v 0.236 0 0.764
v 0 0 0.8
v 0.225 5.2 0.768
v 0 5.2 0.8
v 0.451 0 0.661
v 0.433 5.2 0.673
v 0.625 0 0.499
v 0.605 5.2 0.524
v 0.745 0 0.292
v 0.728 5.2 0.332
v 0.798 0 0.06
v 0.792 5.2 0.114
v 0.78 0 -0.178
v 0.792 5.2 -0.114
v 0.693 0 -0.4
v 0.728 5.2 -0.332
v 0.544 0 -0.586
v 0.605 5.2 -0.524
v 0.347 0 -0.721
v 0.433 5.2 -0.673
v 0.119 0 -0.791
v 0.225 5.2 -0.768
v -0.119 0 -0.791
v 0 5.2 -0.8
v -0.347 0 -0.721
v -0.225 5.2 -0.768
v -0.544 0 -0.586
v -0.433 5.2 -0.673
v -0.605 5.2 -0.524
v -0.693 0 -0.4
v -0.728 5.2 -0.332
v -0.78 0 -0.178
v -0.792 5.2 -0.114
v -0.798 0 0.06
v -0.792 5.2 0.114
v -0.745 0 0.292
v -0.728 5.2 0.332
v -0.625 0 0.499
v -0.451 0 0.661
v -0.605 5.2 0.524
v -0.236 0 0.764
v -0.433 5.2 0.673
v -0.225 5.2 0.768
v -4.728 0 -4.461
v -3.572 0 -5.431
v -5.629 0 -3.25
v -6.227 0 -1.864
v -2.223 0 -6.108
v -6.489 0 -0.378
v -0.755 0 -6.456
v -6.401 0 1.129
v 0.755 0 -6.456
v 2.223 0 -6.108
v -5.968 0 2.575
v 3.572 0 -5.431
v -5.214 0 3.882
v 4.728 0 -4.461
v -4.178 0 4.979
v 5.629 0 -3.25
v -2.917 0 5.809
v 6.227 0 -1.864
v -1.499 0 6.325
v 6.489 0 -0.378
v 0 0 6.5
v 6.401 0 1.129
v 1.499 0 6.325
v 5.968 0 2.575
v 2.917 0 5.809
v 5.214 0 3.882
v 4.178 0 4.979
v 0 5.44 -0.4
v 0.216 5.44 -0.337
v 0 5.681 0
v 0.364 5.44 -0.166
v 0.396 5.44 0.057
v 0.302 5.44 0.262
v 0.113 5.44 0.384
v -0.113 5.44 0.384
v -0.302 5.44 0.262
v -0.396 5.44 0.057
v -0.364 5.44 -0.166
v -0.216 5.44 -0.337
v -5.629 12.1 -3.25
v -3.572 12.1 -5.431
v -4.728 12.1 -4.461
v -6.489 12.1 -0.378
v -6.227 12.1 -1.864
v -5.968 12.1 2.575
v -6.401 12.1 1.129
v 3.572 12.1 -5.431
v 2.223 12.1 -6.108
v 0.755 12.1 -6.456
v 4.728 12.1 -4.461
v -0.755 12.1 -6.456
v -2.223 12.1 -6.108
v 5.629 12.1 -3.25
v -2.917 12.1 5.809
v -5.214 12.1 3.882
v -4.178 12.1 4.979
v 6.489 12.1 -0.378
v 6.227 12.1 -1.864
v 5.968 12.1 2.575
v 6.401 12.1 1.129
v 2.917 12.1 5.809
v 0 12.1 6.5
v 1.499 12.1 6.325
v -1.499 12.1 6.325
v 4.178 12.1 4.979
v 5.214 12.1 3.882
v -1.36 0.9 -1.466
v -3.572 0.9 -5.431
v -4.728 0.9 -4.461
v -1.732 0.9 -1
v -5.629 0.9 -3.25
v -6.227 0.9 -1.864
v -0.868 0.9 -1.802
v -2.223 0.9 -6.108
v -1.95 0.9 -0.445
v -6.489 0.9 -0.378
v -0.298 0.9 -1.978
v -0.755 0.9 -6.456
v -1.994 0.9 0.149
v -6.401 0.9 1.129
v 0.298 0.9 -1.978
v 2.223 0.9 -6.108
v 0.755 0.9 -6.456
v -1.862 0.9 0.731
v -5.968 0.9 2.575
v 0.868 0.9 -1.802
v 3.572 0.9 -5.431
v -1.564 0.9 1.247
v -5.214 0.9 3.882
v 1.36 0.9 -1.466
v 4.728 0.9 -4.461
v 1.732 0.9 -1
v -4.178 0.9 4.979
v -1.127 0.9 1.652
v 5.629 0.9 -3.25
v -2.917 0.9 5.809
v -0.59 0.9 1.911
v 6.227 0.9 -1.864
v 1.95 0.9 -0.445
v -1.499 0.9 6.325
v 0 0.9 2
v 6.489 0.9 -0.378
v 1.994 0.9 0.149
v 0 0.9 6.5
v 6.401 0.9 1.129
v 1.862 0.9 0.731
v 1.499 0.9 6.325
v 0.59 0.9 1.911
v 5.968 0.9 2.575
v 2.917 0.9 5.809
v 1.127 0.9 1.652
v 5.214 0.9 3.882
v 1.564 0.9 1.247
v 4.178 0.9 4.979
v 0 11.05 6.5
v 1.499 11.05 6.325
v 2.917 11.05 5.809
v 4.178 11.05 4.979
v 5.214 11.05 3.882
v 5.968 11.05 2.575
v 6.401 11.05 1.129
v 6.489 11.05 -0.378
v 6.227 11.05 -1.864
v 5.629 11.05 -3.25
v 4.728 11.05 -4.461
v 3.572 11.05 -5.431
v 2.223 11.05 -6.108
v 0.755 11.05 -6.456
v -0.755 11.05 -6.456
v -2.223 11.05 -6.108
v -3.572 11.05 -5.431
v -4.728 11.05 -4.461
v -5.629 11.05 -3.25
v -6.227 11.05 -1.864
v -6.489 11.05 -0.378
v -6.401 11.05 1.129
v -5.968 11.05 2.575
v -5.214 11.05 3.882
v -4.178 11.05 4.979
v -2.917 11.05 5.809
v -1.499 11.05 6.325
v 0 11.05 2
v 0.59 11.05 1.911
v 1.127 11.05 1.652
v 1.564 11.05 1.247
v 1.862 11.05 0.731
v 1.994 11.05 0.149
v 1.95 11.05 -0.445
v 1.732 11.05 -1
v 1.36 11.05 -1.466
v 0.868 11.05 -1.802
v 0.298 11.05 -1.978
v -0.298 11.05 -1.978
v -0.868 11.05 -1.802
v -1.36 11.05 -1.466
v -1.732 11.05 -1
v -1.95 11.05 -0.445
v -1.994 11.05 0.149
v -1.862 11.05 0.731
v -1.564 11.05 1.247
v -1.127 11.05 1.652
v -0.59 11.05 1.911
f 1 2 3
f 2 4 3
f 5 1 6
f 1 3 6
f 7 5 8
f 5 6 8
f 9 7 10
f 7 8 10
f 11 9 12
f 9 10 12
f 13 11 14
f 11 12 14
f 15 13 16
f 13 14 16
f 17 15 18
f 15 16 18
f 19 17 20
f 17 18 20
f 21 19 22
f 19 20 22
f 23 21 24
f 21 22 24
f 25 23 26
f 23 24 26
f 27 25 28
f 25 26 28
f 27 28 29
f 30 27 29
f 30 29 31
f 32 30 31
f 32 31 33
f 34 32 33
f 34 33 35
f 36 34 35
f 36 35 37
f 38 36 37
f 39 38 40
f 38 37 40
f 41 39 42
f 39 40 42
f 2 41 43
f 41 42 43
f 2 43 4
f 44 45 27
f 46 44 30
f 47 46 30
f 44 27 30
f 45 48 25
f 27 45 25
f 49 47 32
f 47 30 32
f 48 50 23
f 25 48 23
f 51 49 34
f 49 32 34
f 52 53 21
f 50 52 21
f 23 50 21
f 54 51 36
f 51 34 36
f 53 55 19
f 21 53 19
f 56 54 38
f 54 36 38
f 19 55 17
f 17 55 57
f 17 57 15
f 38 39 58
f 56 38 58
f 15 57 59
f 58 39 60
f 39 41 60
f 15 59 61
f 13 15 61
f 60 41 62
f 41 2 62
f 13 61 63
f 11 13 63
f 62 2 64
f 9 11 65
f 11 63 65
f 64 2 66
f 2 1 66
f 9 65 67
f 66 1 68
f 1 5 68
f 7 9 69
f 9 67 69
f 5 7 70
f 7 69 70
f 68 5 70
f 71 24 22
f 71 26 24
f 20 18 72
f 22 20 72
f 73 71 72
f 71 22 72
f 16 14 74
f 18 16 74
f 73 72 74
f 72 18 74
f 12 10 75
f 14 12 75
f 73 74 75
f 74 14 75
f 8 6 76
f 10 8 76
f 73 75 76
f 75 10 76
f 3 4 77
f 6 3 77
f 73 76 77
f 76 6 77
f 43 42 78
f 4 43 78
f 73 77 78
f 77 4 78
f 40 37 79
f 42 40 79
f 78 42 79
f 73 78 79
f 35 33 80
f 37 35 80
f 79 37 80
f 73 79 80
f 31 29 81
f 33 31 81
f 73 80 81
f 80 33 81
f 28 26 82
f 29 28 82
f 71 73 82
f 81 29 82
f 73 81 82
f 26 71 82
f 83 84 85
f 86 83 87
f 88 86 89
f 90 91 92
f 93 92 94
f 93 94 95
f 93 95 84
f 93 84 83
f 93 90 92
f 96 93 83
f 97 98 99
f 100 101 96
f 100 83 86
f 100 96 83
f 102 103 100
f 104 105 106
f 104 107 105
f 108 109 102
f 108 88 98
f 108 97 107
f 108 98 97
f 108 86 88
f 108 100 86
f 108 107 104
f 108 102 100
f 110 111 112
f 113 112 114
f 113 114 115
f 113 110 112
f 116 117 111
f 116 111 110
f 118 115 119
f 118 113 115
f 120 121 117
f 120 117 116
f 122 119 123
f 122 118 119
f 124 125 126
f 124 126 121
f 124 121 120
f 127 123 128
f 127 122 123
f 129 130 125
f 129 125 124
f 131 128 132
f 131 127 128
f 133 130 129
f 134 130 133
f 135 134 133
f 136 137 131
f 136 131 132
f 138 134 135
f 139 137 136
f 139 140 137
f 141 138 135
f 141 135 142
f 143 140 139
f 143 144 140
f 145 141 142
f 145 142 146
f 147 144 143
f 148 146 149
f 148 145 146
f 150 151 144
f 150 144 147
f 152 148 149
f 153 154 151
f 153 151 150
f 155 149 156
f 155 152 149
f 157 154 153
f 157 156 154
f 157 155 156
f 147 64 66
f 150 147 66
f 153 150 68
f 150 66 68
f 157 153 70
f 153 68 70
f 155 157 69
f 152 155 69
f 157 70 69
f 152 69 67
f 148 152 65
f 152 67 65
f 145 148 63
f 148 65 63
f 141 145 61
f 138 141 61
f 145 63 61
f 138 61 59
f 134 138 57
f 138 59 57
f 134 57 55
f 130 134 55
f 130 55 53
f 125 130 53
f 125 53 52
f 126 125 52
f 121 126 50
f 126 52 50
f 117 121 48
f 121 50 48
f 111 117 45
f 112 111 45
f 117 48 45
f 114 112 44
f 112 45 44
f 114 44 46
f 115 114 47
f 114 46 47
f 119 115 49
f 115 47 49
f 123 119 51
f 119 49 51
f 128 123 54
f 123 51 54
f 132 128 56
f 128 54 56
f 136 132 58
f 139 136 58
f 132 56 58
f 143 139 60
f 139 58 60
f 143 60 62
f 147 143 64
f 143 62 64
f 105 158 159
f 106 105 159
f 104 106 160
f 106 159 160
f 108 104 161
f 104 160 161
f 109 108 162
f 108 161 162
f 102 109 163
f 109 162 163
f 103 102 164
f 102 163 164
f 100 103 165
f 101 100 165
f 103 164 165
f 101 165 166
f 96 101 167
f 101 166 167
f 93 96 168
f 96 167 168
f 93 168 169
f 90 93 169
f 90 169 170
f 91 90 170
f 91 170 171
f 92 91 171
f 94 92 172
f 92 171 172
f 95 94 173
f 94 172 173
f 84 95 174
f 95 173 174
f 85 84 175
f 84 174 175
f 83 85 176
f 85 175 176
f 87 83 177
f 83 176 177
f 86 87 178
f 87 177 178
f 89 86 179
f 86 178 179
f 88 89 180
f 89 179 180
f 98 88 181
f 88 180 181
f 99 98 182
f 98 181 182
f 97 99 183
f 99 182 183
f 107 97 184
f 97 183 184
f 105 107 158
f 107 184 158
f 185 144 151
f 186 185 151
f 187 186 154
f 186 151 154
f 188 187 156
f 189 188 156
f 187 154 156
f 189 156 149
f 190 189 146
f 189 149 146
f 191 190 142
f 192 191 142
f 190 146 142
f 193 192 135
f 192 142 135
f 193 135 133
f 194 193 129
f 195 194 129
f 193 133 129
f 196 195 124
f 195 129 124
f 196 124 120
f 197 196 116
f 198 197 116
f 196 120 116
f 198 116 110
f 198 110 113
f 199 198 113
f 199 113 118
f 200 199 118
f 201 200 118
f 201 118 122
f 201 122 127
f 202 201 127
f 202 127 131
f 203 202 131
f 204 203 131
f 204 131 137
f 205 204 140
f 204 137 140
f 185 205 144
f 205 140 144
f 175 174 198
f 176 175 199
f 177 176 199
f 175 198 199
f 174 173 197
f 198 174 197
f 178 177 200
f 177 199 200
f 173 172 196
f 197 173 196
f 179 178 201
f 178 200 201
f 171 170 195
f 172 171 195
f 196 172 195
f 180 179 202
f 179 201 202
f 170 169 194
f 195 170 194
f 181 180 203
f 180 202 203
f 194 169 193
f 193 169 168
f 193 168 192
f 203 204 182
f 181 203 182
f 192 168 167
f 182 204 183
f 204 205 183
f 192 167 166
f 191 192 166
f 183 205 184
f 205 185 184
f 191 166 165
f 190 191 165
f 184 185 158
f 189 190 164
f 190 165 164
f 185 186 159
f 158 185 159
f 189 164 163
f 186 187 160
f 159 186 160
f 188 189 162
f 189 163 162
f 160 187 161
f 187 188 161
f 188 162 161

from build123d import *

# Parameters (mm, degrees)
SKETCH_1_R      = 6.5
EXTRUDE_1_DEPTH = 0.9
SKETCH_2_R      = 2
EXTRUDE_2_DEPTH = 10.15
SKETCH_3_R      = 6.5
EXTRUDE_3_DEPTH = 1.05
M2X0_4_1_D      = 1.6
M2X0_4_1_DEPTH  = 5.2
M2X0_4_1_TIP    = 0.480688495


with BuildPart() as part:
    # 草图1 → 凸台-拉伸1 (new body)
    with BuildSketch(Plane(origin=(0, 0, 0), x_dir=(1, 0, 0), z_dir=(0, 1, 0))):
        with Locations(Location((0, 0, 0), (0, 0, 270))):
            Circle(SKETCH_1_R)
    extrude(amount=EXTRUDE_1_DEPTH)

    # 草图2 → 凸台-拉伸2 (add)
    with BuildSketch(Plane(origin=(0, 0.9, 0), x_dir=(1, 0, 0), z_dir=(0, 1, 0))):
        with Locations(Location((0, 0, 0), (0, 0, 270))):
            Circle(SKETCH_2_R)
    extrude(amount=EXTRUDE_2_DEPTH)

    # 草图3 → 凸台-拉伸3 (add)
    with BuildSketch(Plane(origin=(0, 11.05, 0), x_dir=(1, 0, 0), z_dir=(0, 1, 0))):
        with Locations(Location((0, 0, 0), (0, 0, 270))):
            Circle(SKETCH_3_R)
    extrude(amount=EXTRUDE_3_DEPTH)

    # M2x0.4 螺纹孔1
    with Locations(Plane(origin=(0, 0, 0), x_dir=(0, 0, -1), z_dir=(0, -1, 0))):
        with Locations((0, 0)):
            Hole(M2X0_4_1_D / 2, depth=M2X0_4_1_DEPTH)
            with Locations((0, 0, -(M2X0_4_1_DEPTH + M2X0_4_1_TIP / 2))):  # 118° drill point
                Cone(0, M2X0_4_1_D / 2, M2X0_4_1_TIP, mode=Mode.SUBTRACT)


solid = part.part
